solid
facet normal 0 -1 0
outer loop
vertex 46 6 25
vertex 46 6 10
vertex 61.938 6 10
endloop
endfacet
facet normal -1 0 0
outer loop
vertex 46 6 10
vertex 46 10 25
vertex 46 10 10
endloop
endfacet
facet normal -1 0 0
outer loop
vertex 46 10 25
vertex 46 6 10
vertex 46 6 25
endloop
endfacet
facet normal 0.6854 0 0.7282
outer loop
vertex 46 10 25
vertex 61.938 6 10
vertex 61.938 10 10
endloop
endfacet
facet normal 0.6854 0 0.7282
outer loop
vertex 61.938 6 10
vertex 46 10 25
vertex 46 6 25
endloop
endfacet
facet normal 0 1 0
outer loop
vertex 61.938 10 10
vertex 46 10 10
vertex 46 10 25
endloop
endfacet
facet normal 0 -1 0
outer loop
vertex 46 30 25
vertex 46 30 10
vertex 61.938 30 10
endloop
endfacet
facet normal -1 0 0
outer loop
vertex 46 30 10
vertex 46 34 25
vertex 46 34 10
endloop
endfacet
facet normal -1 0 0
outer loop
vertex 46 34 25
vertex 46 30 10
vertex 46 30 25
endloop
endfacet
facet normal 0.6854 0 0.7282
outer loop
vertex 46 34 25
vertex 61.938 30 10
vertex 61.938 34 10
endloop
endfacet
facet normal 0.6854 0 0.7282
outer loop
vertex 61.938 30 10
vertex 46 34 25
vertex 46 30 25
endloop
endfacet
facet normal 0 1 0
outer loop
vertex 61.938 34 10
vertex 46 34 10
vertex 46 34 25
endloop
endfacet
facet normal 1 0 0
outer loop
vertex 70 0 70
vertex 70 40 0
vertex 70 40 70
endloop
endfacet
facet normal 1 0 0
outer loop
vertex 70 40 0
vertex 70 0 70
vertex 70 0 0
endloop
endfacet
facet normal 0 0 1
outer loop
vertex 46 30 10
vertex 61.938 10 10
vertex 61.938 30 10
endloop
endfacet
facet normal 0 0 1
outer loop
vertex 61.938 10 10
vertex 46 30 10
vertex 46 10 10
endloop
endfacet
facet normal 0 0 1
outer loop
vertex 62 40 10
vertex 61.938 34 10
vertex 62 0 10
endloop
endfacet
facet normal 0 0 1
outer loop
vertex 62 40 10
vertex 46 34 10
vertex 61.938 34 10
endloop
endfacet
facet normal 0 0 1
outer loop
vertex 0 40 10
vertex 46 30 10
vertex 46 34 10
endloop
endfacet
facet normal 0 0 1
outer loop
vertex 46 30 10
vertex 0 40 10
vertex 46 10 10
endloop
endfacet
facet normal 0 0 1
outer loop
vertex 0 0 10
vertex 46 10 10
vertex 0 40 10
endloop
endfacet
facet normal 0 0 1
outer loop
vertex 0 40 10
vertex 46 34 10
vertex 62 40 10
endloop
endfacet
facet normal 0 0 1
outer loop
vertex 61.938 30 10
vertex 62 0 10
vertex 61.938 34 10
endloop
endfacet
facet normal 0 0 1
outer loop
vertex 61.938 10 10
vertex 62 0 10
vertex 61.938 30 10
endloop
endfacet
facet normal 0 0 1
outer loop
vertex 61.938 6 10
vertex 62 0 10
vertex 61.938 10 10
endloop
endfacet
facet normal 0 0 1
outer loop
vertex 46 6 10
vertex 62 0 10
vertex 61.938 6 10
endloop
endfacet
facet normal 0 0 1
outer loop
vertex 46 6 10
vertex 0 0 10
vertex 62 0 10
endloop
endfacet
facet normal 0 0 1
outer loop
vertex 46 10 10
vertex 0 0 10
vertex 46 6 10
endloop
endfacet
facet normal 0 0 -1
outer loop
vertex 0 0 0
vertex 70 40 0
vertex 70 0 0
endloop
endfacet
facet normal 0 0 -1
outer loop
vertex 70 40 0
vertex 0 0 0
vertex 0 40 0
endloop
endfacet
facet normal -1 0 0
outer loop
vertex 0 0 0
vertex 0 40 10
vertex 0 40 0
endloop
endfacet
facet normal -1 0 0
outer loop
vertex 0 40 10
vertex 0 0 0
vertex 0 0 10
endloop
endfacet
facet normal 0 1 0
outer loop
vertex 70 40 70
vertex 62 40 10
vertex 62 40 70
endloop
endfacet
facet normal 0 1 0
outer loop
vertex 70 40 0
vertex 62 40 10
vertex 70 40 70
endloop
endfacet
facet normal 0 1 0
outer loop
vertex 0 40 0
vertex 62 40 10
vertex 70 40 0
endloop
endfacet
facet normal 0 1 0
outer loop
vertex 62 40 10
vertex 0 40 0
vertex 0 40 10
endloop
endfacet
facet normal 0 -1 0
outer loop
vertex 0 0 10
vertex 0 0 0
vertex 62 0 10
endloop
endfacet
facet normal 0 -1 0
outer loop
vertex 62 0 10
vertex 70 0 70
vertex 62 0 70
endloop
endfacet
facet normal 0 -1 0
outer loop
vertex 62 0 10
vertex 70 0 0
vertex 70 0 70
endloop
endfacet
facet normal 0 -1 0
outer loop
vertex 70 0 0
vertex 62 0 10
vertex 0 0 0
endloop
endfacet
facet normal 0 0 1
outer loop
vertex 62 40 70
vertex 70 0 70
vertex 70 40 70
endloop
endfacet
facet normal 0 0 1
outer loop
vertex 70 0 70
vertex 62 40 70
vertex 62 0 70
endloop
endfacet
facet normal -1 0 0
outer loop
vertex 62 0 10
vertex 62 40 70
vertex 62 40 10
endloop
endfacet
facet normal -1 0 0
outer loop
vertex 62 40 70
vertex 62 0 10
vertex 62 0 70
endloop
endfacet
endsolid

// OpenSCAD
$fn = 32;

// ----------------------------------------------------------------------
// Rib bracket: 2-gusset L bracket
// ----------------------------------------------------------------------

// --- parameters (mm) ---
base_l = 70;              // foot length, X
base_w = 40;              // foot width, Y
base_t = 10;              // foot thickness
plate_t = 8;              // upright plate thickness
plate_h = 70;             // overall height
gus_l = 16;               // gusset leg along the foot
gus_h = 16;               // gusset height
gus_t = 4;                // gusset thickness
gus_edge = 6;             // gusset margin from the foot edge
n_gus = 2;                // gusset count
fit_tol = 0.05;           // tolerance for press fits, mm
free_tol = 0.2;           // tolerance for clearance fits, mm

gus_pitch = (base_w - 2 * gus_edge - gus_t) / (n_gus - 1);  // gusset pitch

union() {
  cube([base_l, base_w, base_t]);
  translate([base_l - plate_t, 0, base_t - 1])
    cube([plate_t, base_w, plate_h - base_t + 1]);
  for (i = [0 : n_gus - 1])
    translate([base_l - plate_t - gus_l, gus_edge + i * gus_pitch, base_t - 1])
      rotate([-90, 0, 0])
        linear_extrude(height = gus_t)
          polygon(points = [[0, 0], [gus_l + 1, 0], [0, -gus_h]]);
}
